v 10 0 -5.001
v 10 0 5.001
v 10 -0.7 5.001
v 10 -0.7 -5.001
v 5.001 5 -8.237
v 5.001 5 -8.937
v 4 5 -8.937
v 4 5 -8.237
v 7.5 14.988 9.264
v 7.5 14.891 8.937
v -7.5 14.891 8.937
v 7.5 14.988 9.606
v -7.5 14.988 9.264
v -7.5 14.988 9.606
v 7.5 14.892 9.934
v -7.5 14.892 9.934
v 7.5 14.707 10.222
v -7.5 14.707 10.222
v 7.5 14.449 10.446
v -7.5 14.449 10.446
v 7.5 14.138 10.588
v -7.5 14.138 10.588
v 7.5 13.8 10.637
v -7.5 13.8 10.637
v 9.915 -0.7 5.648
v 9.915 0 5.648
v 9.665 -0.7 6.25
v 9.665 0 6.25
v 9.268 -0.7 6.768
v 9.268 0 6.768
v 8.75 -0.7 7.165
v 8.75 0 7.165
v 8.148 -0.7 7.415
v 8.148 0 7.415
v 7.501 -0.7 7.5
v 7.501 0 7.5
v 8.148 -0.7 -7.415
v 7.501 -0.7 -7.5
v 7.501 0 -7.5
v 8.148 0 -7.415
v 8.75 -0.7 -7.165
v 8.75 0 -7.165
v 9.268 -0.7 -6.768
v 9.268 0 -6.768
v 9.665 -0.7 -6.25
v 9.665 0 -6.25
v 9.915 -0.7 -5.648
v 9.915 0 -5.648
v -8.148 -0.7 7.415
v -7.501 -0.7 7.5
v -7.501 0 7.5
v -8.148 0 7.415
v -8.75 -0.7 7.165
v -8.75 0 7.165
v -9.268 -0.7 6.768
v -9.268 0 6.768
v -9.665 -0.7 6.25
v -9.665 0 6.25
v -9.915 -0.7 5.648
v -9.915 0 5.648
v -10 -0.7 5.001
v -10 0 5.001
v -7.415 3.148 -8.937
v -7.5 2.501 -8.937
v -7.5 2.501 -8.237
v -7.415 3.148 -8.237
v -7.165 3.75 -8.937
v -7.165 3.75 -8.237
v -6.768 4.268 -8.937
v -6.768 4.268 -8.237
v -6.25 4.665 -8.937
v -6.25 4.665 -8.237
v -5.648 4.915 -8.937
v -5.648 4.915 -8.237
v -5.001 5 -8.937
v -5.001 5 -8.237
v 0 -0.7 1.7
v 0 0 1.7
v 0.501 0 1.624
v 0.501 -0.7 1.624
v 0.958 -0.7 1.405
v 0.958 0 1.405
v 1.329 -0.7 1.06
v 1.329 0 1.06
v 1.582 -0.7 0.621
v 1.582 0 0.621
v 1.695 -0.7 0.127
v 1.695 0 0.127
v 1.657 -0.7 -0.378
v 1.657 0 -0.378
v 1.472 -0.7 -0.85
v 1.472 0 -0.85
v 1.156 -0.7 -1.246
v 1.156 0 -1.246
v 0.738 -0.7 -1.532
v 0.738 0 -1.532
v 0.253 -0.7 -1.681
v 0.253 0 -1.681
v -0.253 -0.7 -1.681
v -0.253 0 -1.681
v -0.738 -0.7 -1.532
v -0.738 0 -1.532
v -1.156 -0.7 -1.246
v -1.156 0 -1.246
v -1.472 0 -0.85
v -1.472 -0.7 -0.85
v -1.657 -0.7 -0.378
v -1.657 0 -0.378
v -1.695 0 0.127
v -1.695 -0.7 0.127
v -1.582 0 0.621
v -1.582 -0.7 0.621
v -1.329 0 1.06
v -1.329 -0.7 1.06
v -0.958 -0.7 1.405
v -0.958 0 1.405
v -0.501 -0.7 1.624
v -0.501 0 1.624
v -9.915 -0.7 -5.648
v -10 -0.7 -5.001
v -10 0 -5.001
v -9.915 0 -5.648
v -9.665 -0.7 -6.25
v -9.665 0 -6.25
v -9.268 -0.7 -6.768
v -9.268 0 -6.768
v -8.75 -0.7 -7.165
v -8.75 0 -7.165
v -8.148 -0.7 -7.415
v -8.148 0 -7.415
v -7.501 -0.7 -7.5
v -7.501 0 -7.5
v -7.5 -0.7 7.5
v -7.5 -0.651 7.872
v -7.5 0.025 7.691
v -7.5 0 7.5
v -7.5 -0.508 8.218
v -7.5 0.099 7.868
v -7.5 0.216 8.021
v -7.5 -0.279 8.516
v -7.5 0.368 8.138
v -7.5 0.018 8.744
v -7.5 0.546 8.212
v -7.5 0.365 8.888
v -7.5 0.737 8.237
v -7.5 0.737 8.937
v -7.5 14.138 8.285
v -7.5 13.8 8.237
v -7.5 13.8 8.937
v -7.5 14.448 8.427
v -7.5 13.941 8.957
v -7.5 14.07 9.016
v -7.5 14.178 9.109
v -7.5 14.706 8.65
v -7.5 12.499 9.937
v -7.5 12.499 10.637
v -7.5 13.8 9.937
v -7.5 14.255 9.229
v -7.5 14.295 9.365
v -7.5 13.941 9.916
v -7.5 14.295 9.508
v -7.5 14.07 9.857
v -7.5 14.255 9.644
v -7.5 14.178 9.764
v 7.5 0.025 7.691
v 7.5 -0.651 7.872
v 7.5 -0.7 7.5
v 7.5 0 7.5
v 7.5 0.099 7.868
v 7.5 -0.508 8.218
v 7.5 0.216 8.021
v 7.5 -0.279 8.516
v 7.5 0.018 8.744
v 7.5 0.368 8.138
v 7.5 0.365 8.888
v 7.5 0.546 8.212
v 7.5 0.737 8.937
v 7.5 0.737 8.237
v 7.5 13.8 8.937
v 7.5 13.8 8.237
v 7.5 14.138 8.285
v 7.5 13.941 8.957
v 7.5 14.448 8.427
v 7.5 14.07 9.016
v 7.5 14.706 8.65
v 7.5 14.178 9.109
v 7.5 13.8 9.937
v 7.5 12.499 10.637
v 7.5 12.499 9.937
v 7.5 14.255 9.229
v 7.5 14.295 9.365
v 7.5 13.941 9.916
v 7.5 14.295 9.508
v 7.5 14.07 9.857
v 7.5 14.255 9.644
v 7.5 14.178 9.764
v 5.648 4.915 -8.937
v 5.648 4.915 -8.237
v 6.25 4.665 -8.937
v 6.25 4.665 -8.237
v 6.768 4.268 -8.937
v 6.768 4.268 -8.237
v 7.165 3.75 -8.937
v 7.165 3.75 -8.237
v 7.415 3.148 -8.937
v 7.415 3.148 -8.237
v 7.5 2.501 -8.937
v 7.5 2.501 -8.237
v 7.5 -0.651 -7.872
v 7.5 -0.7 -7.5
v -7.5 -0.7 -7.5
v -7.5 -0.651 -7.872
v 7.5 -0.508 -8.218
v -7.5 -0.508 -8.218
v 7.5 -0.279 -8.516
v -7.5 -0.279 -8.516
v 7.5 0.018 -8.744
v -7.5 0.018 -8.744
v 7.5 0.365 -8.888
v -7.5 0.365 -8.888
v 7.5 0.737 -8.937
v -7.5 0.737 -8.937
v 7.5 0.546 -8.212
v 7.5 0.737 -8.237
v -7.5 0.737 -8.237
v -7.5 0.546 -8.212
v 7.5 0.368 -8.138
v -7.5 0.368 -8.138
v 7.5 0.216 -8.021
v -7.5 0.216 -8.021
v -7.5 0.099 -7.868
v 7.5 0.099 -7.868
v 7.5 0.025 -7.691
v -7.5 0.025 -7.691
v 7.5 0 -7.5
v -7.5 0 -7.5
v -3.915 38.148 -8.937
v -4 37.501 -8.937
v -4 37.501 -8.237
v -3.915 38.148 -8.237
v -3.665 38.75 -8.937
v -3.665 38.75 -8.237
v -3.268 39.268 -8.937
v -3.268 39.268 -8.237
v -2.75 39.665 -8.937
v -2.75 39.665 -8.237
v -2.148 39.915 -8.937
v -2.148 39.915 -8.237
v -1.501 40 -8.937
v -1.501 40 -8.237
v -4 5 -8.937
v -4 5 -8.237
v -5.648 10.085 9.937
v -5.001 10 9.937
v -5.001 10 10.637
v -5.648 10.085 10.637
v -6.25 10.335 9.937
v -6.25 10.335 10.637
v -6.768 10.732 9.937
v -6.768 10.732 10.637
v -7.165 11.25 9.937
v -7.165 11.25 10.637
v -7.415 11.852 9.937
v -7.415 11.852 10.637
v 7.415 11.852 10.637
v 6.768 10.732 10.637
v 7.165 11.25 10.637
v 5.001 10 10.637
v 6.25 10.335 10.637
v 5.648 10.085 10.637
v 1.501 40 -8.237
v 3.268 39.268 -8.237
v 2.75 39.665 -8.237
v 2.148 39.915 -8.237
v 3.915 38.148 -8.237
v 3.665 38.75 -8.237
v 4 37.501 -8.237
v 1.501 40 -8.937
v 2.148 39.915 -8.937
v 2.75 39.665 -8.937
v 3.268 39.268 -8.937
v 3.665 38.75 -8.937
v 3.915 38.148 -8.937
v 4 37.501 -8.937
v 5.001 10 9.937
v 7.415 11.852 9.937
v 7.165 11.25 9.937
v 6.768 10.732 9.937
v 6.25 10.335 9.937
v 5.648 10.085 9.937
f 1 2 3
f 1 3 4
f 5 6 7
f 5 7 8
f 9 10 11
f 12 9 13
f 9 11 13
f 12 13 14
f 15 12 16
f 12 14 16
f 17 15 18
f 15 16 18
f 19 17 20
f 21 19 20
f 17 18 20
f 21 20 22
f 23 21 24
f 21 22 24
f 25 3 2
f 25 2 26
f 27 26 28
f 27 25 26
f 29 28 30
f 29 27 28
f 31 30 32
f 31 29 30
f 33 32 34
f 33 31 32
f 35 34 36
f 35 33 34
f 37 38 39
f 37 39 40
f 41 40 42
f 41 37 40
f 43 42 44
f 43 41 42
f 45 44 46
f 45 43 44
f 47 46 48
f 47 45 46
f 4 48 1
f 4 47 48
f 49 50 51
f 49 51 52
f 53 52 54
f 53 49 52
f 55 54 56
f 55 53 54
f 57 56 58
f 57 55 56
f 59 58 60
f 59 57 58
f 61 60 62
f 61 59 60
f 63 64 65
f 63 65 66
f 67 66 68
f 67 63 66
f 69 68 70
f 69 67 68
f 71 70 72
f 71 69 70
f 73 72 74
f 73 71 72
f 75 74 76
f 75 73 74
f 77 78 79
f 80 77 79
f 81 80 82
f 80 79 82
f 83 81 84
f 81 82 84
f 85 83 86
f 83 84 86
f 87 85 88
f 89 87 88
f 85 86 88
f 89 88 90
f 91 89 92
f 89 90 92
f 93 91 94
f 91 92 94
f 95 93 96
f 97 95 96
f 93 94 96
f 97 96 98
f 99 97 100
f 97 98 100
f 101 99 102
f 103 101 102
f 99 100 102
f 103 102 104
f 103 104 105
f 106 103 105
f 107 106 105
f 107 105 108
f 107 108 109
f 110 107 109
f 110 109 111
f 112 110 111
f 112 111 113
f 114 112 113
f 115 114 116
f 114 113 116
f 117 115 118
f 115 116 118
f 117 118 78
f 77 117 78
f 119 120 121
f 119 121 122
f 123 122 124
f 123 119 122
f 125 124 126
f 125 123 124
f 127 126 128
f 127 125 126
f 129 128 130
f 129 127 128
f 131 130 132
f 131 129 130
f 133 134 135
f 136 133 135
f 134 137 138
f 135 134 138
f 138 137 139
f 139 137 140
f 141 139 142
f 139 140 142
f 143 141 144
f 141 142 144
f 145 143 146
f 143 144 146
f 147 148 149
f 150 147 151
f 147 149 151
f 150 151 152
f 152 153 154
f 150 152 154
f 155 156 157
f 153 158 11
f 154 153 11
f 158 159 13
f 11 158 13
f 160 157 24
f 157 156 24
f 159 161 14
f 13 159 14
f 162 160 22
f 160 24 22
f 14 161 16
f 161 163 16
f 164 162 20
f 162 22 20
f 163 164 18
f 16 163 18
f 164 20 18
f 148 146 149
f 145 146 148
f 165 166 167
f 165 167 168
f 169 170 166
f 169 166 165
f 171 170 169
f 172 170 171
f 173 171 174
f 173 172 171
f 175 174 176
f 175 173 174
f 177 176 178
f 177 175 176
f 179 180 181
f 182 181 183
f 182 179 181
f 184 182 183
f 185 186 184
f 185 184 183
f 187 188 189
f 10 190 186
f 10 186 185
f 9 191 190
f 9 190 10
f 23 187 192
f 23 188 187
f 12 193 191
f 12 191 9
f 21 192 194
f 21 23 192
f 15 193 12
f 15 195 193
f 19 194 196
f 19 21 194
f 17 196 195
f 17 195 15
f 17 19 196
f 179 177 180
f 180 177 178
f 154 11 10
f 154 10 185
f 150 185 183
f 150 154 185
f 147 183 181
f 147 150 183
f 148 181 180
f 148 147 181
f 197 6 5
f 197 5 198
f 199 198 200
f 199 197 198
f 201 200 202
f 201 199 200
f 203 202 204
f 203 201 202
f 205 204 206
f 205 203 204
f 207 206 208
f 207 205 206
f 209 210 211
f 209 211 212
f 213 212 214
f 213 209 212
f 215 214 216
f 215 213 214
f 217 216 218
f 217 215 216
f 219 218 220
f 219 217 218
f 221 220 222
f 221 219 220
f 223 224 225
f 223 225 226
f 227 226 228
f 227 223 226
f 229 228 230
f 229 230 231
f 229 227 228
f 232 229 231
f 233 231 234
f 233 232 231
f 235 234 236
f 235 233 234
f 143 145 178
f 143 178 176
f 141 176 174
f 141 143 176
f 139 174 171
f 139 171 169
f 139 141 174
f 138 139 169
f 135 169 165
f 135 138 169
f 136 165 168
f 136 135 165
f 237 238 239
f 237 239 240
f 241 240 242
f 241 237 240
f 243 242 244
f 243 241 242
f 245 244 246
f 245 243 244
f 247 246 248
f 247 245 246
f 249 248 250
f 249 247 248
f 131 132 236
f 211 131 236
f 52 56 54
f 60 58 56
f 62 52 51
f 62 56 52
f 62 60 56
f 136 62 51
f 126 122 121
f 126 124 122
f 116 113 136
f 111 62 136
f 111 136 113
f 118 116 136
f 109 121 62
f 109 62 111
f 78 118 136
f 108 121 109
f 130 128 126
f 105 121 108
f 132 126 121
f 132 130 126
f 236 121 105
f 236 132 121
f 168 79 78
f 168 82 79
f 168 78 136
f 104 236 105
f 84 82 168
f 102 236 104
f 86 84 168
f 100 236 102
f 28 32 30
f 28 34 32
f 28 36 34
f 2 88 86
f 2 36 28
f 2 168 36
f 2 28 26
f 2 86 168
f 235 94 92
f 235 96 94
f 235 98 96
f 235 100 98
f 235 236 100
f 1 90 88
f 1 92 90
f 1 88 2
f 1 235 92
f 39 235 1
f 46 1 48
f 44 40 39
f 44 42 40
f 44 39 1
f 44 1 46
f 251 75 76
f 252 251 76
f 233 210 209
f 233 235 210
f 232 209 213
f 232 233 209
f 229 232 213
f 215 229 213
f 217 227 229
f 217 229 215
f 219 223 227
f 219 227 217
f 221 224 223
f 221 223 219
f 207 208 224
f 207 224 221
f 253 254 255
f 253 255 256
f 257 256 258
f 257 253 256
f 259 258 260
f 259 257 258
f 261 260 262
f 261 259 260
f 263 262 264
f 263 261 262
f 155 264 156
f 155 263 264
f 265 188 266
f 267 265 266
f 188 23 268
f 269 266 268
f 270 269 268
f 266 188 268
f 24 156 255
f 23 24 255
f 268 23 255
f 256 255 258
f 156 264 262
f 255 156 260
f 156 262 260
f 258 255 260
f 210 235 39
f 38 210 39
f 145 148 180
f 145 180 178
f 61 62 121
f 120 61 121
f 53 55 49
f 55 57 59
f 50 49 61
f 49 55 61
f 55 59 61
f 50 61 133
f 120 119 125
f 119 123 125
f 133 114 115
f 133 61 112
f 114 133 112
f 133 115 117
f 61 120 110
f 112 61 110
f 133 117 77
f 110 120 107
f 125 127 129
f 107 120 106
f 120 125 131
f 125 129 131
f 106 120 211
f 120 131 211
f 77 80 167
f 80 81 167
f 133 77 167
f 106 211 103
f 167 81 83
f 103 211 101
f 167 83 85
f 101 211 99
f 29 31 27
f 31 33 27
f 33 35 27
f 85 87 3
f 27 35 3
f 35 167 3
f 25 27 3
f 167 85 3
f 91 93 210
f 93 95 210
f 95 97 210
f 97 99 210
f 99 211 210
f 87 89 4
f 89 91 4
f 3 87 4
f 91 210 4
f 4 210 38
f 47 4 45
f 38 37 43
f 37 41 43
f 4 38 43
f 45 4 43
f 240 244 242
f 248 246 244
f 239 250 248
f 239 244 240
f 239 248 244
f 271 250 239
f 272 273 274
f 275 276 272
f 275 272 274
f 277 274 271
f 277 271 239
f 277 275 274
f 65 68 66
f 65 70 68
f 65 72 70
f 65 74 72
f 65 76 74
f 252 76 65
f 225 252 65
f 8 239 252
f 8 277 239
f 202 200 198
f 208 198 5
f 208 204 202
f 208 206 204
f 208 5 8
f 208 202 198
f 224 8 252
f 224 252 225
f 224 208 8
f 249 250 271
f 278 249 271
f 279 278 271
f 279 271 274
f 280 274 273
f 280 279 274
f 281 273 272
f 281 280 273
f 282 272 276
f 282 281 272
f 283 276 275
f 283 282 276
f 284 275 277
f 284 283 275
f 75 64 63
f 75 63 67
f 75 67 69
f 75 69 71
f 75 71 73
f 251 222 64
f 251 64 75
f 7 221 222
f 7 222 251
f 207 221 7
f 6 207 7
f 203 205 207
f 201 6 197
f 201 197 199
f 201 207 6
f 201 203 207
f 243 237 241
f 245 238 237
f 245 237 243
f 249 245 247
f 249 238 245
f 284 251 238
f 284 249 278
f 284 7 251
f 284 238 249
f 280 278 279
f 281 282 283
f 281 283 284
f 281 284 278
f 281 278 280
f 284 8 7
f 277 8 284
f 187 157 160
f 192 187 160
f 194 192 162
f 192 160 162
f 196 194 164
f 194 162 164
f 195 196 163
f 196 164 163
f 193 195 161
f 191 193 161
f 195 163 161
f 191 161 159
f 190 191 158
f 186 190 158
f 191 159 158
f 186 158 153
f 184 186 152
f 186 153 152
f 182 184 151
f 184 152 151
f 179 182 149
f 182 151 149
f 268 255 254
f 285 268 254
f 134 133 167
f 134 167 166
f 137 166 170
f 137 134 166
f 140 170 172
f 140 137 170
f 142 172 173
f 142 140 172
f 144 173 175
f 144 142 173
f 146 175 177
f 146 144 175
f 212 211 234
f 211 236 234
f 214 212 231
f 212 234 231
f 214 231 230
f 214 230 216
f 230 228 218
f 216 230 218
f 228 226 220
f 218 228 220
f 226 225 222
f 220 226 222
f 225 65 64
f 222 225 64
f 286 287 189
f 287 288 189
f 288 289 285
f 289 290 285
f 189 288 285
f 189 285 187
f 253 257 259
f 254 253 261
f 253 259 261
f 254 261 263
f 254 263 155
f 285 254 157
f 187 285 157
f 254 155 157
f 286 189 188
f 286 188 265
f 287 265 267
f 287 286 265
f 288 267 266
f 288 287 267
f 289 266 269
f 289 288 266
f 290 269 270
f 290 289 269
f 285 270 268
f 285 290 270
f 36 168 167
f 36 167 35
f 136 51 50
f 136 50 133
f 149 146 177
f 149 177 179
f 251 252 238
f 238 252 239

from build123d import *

# Parameters (mm, degrees)
SKETCH1_W             = 20
SKETCH1_H             = 15
BASE_FLANGE1_DEPTH    = 0.7
EDGE_FLANGE1_DEPTH    = 15
SKETCH7_W             = 8
SKETCH7_H             = 35
TAB1_DEPTH            = 0.7
EDGE_FLANGE2_DEPTH    = 15
HEM1_START            = -7.5
HEM1_DEPTH            = 15
HEM1_2_DEPTH          = 15
SKETCH13_R            = 1.7
CUT_EXTRUDE1_DEPTH    = 0.7
BREAK_CORNER2_START   = -8.9366
BREAK_CORNER2_DEPTH   = 0.7
BREAK_CORNER2_START_2 = 9.9366
BREAK_CORNER2_2_DEPTH = 0.7
BREAK_CORNER2_START_3 = -0.7
BREAK_CORNER2_3_DEPTH = 0.7


# Read off the part's stored shape, not the designer's step: Hem1, Break-Corner2
# Sheet-metal steps are written as plain solids
with BuildPart() as part:
    # Sketch1 → Base-Flange1 (new body)
    with BuildSketch(Plane(origin=(0, 0, 0), x_dir=(1, 0, 0), z_dir=(0, 1, 0))):
        Rectangle(SKETCH1_W, SKETCH1_H)
    extrude(amount=-BASE_FLANGE1_DEPTH)

    # Edge-Flange1 section (across the edge) → Edge-Flange1 (add)
    with BuildSketch(Plane(origin=(7.5, 0, -8.2366), x_dir=(0, 0, 1), z_dir=(-1, 0, 0))):
        with BuildLine():
            Line((-0.7, 0.7366), (-0.7, 5))
            Line((-0.7, 5), (0, 5))
            Line((0, 5), (0, 0.7366))
            ThreePointArc((0, 0.7366), (0.215745145, 0.215745145), (0.7366, 0))
            Line((0.7366, 0), (0.7366, -0.7))
            ThreePointArc((0.7366, -0.7), (-0.279229602, -0.279229602), (-0.7, 0.7366))
        make_face()
    extrude(amount=EDGE_FLANGE1_DEPTH)

    # Sketch7 → Tab1 (add)
    with BuildSketch(Plane.XY.offset(-8.2366)):
        with Locations((0, 22.5)):
            Rectangle(SKETCH7_W, SKETCH7_H)
    extrude(amount=-TAB1_DEPTH)

    # Edge-Flange2 section (across the edge) → Edge-Flange2 (add)
    with BuildSketch(Plane(origin=(-7.5, 0, 8.2366), x_dir=(0, 0, -1), z_dir=(1, 0, 0))):
        with BuildLine():
            Line((-0.7, 0.7366), (-0.7, 15))
            Line((-0.7, 15), (0, 15))
            Line((0, 15), (0, 0.7366))
            ThreePointArc((0, 0.7366), (0.215745145, 0.215745145), (0.7366, 0))
            Line((0.7366, 0), (0.7366, -0.7))
            ThreePointArc((0.7366, -0.7), (-0.279229602, -0.279229602), (-0.7, 0.7366))
        make_face()
    extrude(amount=EDGE_FLANGE2_DEPTH)

    # Hem1 outline → Hem1 (cut)
    with BuildSketch(Plane.YZ.offset(HEM1_START)):
        with BuildLine():
            Line((15, 8.9366), (14.890871211, 8.9366))
            ThreePointArc((14.890871211, 8.9366), (14.44807407, 8.426649506), (13.8, 8.2366))
            Line((13.8, 8.2366), (15, 8.2366))
            Line((15, 8.2366), (15, 8.9366))
        make_face()
    extrude(amount=HEM1_DEPTH, mode=Mode.SUBTRACT)

    # Hem1 2 outline → Hem1 2 (add)
    with BuildSketch(Plane.YZ.offset(HEM1_START)):
        with BuildLine():
            Line((10, 10.6366), (10, 9.9366))
            Line((10, 9.9366), (13.8, 9.9366))
            ThreePointArc((13.8, 9.9366), (14.3, 9.4366), (13.8, 8.9366))
            Line((13.8, 8.9366), (14.890871211, 8.9366))
            ThreePointArc((14.890871211, 8.9366), (14.809950494, 10.08467407), (13.8, 10.6366))
            Line((13.8, 10.6366), (10, 10.6366))
        make_face()
    extrude(amount=HEM1_2_DEPTH)

    # Sketch13 → Cut-Extrude1 (cut)
    with BuildSketch(Plane(origin=(0, 0, 0), x_dir=(1, 0, 0), z_dir=(0, 1, 0))):
        with Locations(Location((0, 0, 0), (0, 0, 270))):
            Circle(SKETCH13_R)
    extrude(amount=-CUT_EXTRUDE1_DEPTH, mode=Mode.SUBTRACT)

    # Break-Corner2 outline → Break-Corner2 (cut)
    with BuildSketch(Plane.XY.offset(BREAK_CORNER2_START)):
        with BuildLine():
            Line((7.5, 5), (5.001, 5))
            ThreePointArc((5.001, 5), (6.768059846, 4.268059846), (7.5, 2.501))
            Line((7.5, 2.501), (7.5, 5))
        make_face()
        with BuildLine():
            ThreePointArc((-7.5, 2.501), (-6.768059846, 4.268059846), (-5.001, 5))
            Line((-5.001, 5), (-7.5, 5))
            Line((-7.5, 5), (-7.5, 2.501))
        make_face()
        with BuildLine():
            Line((-4, 40), (-4, 37.501))
            ThreePointArc((-4, 37.501), (-3.268059846, 39.268059846), (-1.501, 40))
            Line((-1.501, 40), (-4, 40))
        make_face()
        with BuildLine():
            ThreePointArc((1.501, 40), (3.268059846, 39.268059846), (4, 37.501))
            Line((4, 37.501), (4, 40))
            Line((4, 40), (1.501, 40))
        make_face()
    extrude(amount=BREAK_CORNER2_DEPTH, mode=Mode.SUBTRACT)

    # Break-Corner2 2 outline → Break-Corner2 2 (cut)
    with BuildSketch(Plane.XY.offset(BREAK_CORNER2_START_2)):
        with BuildLine():
            ThreePointArc((7.5, 12.499), (6.768059846, 10.731940154), (5.001, 10))
            Line((5.001, 10), (7.5, 10))
            Line((7.5, 10), (7.5, 12.499))
        make_face()
        with BuildLine():
            ThreePointArc((-5.001, 10), (-6.768059846, 10.731940154), (-7.5, 12.499))
            Line((-7.5, 12.499), (-7.5, 10))
            Line((-7.5, 10), (-5.001, 10))
        make_face()
    extrude(amount=BREAK_CORNER2_2_DEPTH, mode=Mode.SUBTRACT)

    # Break-Corner2 3 outline → Break-Corner2 3 (cut)
    with BuildSketch(Plane(origin=(0, 0, 0), x_dir=(1, 0, 0), z_dir=(0, 1, 0)).offset(BREAK_CORNER2_START_3)):
        with BuildLine():
            ThreePointArc((7.501, 7.5), (9.268059846, 6.768059846), (10, 5.001))
            Line((10, 5.001), (10, 7.5))
            Line((10, 7.5), (7.501, 7.5))
        make_face()
        with BuildLine():
            ThreePointArc((10, -5.001), (9.268059846, -6.768059846), (7.501, -7.5))
            Line((7.501, -7.5), (10, -7.5))
            Line((10, -7.5), (10, -5.001))
        make_face()
        with BuildLine():
            Line((-10, 7.5), (-10, 5.001))
            ThreePointArc((-10, 5.001), (-9.268059846, 6.768059846), (-7.501, 7.5))
            Line((-7.501, 7.5), (-10, 7.5))
        make_face()
        with BuildLine():
            ThreePointArc((-7.501, -7.5), (-9.268059846, -6.768059846), (-10, -5.001))
            Line((-10, -5.001), (-10, -7.5))
            Line((-10, -7.5), (-7.501, -7.5))
        make_face()
    extrude(amount=BREAK_CORNER2_3_DEPTH, mode=Mode.SUBTRACT)


solid = part.part
